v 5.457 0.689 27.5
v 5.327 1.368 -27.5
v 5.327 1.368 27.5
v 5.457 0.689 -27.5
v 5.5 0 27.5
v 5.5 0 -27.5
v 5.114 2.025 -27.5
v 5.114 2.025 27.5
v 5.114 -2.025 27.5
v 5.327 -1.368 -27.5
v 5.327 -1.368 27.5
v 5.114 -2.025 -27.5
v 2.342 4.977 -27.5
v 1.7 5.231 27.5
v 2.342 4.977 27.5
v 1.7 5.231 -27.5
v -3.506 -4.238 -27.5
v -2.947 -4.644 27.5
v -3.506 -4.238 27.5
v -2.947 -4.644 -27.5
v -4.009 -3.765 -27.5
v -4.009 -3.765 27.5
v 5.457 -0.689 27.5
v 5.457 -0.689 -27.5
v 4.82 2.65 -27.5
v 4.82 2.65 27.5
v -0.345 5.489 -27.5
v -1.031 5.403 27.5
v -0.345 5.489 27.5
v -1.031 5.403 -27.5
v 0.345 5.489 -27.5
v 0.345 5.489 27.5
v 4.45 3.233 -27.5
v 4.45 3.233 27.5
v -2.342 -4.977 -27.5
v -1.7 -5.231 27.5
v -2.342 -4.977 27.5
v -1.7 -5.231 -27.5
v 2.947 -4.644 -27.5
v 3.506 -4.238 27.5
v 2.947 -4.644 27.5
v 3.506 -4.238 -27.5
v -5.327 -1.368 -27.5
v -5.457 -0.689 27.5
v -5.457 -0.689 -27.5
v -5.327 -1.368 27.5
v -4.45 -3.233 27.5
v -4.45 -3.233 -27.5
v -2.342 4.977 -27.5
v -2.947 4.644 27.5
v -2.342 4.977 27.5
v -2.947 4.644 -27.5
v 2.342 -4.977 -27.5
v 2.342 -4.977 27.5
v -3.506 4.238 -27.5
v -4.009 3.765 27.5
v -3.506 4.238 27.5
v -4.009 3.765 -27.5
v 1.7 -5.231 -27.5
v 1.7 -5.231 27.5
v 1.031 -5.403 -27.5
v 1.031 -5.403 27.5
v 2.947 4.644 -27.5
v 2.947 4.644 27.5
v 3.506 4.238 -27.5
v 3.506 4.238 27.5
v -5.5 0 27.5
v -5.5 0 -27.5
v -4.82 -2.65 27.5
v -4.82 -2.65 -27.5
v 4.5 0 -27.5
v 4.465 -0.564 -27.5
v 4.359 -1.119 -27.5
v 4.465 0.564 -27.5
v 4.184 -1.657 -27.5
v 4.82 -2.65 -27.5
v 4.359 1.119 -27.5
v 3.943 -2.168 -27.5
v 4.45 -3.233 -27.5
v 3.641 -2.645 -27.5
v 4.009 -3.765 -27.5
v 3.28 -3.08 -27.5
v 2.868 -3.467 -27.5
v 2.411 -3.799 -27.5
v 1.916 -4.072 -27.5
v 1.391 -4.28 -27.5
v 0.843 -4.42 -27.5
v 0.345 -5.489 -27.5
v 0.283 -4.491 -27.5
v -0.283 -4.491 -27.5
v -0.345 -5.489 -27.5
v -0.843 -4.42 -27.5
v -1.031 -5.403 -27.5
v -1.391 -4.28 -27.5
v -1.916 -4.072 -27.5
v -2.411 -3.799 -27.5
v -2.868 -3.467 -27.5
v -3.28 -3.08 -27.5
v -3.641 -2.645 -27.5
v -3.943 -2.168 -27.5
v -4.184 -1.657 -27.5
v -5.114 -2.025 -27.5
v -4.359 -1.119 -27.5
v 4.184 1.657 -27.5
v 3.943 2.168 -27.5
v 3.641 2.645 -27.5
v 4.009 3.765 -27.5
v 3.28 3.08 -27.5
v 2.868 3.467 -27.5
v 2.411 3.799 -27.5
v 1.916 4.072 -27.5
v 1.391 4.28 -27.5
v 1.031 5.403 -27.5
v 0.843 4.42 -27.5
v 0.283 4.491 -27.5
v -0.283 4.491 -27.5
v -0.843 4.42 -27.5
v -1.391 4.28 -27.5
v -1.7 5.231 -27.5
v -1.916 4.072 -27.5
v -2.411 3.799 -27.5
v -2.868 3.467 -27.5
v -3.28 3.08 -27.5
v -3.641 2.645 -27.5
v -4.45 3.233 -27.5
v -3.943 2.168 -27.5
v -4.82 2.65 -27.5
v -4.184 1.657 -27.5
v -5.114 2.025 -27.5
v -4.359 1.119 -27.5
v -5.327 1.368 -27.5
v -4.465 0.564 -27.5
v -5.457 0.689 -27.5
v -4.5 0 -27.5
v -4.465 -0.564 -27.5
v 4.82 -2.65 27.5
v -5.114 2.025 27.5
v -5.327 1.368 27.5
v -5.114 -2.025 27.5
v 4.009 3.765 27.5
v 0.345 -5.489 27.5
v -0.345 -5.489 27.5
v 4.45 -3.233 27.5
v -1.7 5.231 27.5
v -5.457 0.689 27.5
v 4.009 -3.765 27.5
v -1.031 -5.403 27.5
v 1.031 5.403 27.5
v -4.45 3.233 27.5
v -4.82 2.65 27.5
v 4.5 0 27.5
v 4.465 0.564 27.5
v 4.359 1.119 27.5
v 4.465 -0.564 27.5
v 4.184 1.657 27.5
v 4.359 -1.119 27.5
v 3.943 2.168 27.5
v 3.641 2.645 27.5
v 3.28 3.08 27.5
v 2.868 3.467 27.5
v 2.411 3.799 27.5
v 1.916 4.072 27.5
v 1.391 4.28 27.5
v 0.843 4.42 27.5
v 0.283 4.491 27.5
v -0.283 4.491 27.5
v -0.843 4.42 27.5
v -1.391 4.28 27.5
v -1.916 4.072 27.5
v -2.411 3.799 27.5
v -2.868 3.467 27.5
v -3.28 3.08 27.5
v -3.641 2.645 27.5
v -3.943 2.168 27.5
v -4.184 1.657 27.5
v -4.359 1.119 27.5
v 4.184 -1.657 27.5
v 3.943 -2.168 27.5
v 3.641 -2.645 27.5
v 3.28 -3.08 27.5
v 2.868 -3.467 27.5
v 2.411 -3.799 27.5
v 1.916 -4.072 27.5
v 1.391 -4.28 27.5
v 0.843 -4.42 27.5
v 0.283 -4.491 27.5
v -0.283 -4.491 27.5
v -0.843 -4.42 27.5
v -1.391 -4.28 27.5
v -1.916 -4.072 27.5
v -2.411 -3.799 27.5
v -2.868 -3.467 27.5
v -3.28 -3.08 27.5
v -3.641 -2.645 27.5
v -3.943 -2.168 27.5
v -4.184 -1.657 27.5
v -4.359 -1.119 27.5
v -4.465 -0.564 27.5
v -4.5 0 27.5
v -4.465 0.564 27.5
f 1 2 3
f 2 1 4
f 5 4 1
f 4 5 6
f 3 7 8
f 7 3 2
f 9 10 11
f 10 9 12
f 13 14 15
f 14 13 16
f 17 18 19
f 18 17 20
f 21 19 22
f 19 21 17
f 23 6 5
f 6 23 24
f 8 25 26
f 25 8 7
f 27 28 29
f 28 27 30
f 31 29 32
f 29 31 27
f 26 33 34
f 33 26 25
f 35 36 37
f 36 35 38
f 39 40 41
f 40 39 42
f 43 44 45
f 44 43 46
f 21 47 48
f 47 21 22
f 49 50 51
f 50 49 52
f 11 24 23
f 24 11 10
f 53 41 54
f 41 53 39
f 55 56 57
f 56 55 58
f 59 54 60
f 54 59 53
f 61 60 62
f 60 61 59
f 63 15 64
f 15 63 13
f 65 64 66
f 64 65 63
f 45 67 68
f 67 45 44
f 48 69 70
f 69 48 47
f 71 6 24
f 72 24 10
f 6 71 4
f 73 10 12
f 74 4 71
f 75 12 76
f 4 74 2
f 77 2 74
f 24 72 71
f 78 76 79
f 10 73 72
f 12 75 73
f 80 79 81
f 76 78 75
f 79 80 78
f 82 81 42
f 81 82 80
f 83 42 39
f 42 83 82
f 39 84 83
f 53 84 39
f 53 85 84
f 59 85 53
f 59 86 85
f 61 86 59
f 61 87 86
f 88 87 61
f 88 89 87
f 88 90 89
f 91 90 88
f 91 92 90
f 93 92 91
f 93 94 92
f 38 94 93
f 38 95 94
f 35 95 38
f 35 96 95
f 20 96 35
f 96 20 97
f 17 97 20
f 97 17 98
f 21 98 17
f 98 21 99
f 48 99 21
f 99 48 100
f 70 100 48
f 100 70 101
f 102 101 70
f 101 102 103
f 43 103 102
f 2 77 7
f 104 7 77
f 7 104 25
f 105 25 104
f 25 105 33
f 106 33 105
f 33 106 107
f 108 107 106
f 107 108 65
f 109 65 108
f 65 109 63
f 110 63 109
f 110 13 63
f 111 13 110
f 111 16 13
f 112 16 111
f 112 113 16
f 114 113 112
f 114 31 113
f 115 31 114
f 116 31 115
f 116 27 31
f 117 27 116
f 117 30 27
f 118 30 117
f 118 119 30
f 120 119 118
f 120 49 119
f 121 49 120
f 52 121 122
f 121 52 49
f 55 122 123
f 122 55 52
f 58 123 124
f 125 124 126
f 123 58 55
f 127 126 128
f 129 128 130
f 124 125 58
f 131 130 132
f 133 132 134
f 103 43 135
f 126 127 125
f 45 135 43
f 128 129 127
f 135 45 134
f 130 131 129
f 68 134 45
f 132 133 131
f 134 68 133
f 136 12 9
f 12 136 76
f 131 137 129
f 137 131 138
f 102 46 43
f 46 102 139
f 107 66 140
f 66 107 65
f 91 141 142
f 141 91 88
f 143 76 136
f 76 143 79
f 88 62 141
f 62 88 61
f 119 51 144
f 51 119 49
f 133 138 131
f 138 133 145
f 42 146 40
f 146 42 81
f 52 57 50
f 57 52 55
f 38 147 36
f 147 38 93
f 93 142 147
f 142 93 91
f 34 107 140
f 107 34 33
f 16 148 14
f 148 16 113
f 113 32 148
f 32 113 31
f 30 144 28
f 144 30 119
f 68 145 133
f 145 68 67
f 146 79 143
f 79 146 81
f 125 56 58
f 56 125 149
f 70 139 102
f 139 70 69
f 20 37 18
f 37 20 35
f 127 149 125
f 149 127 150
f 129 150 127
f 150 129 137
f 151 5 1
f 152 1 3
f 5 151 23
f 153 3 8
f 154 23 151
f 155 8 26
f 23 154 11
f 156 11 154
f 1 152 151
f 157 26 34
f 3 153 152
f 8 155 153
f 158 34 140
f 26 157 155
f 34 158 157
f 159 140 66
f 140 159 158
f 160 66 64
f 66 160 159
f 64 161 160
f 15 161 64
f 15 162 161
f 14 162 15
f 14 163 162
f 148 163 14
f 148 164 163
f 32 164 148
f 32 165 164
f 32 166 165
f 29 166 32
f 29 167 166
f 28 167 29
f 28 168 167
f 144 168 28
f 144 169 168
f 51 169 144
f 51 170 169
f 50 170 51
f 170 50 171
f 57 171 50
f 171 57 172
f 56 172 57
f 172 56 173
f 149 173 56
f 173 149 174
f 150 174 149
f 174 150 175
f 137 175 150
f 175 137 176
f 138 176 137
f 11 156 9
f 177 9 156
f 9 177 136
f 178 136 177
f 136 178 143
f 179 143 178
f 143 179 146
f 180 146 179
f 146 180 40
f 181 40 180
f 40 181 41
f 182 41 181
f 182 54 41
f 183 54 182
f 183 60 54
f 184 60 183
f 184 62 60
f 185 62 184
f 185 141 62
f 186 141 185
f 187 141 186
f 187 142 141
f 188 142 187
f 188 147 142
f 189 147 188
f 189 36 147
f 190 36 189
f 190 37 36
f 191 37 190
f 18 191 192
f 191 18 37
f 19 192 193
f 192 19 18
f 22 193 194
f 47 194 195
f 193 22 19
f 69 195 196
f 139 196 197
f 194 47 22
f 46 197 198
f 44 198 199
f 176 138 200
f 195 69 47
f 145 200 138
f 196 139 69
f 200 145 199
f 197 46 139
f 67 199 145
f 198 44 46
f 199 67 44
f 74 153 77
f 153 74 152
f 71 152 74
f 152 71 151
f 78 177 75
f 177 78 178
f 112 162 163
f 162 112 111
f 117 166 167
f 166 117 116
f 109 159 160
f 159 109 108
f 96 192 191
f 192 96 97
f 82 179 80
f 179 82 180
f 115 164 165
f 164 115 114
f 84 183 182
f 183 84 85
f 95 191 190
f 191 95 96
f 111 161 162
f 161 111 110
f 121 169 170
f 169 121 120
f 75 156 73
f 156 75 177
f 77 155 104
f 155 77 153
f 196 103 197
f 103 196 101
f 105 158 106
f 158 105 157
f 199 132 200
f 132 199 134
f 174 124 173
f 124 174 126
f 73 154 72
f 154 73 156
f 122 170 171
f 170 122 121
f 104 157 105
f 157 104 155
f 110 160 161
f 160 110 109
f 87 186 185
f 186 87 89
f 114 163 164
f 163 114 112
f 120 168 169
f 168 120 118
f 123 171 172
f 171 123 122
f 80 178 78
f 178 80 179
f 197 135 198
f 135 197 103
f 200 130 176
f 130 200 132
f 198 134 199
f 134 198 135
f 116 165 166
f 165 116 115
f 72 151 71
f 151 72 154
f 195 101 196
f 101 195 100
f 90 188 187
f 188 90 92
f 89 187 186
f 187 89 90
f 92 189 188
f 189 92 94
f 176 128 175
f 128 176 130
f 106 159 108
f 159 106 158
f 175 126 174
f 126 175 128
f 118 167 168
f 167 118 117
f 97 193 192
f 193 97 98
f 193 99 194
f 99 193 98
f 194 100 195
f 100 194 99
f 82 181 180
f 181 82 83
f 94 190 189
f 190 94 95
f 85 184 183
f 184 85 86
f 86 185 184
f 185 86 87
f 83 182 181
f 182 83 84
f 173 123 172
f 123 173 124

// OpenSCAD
$fn = 50;


difference() {
	union() {
		translate(v = [0, 0, -27.5000000000]) {
			cylinder(h = 55, r = 5.5000000000);
		}
	}
	union() {
		translate(v = [0, 0, -100.0000000000]) {
			cylinder(h = 200, r = 4.5000000000);
		}
	}
}
